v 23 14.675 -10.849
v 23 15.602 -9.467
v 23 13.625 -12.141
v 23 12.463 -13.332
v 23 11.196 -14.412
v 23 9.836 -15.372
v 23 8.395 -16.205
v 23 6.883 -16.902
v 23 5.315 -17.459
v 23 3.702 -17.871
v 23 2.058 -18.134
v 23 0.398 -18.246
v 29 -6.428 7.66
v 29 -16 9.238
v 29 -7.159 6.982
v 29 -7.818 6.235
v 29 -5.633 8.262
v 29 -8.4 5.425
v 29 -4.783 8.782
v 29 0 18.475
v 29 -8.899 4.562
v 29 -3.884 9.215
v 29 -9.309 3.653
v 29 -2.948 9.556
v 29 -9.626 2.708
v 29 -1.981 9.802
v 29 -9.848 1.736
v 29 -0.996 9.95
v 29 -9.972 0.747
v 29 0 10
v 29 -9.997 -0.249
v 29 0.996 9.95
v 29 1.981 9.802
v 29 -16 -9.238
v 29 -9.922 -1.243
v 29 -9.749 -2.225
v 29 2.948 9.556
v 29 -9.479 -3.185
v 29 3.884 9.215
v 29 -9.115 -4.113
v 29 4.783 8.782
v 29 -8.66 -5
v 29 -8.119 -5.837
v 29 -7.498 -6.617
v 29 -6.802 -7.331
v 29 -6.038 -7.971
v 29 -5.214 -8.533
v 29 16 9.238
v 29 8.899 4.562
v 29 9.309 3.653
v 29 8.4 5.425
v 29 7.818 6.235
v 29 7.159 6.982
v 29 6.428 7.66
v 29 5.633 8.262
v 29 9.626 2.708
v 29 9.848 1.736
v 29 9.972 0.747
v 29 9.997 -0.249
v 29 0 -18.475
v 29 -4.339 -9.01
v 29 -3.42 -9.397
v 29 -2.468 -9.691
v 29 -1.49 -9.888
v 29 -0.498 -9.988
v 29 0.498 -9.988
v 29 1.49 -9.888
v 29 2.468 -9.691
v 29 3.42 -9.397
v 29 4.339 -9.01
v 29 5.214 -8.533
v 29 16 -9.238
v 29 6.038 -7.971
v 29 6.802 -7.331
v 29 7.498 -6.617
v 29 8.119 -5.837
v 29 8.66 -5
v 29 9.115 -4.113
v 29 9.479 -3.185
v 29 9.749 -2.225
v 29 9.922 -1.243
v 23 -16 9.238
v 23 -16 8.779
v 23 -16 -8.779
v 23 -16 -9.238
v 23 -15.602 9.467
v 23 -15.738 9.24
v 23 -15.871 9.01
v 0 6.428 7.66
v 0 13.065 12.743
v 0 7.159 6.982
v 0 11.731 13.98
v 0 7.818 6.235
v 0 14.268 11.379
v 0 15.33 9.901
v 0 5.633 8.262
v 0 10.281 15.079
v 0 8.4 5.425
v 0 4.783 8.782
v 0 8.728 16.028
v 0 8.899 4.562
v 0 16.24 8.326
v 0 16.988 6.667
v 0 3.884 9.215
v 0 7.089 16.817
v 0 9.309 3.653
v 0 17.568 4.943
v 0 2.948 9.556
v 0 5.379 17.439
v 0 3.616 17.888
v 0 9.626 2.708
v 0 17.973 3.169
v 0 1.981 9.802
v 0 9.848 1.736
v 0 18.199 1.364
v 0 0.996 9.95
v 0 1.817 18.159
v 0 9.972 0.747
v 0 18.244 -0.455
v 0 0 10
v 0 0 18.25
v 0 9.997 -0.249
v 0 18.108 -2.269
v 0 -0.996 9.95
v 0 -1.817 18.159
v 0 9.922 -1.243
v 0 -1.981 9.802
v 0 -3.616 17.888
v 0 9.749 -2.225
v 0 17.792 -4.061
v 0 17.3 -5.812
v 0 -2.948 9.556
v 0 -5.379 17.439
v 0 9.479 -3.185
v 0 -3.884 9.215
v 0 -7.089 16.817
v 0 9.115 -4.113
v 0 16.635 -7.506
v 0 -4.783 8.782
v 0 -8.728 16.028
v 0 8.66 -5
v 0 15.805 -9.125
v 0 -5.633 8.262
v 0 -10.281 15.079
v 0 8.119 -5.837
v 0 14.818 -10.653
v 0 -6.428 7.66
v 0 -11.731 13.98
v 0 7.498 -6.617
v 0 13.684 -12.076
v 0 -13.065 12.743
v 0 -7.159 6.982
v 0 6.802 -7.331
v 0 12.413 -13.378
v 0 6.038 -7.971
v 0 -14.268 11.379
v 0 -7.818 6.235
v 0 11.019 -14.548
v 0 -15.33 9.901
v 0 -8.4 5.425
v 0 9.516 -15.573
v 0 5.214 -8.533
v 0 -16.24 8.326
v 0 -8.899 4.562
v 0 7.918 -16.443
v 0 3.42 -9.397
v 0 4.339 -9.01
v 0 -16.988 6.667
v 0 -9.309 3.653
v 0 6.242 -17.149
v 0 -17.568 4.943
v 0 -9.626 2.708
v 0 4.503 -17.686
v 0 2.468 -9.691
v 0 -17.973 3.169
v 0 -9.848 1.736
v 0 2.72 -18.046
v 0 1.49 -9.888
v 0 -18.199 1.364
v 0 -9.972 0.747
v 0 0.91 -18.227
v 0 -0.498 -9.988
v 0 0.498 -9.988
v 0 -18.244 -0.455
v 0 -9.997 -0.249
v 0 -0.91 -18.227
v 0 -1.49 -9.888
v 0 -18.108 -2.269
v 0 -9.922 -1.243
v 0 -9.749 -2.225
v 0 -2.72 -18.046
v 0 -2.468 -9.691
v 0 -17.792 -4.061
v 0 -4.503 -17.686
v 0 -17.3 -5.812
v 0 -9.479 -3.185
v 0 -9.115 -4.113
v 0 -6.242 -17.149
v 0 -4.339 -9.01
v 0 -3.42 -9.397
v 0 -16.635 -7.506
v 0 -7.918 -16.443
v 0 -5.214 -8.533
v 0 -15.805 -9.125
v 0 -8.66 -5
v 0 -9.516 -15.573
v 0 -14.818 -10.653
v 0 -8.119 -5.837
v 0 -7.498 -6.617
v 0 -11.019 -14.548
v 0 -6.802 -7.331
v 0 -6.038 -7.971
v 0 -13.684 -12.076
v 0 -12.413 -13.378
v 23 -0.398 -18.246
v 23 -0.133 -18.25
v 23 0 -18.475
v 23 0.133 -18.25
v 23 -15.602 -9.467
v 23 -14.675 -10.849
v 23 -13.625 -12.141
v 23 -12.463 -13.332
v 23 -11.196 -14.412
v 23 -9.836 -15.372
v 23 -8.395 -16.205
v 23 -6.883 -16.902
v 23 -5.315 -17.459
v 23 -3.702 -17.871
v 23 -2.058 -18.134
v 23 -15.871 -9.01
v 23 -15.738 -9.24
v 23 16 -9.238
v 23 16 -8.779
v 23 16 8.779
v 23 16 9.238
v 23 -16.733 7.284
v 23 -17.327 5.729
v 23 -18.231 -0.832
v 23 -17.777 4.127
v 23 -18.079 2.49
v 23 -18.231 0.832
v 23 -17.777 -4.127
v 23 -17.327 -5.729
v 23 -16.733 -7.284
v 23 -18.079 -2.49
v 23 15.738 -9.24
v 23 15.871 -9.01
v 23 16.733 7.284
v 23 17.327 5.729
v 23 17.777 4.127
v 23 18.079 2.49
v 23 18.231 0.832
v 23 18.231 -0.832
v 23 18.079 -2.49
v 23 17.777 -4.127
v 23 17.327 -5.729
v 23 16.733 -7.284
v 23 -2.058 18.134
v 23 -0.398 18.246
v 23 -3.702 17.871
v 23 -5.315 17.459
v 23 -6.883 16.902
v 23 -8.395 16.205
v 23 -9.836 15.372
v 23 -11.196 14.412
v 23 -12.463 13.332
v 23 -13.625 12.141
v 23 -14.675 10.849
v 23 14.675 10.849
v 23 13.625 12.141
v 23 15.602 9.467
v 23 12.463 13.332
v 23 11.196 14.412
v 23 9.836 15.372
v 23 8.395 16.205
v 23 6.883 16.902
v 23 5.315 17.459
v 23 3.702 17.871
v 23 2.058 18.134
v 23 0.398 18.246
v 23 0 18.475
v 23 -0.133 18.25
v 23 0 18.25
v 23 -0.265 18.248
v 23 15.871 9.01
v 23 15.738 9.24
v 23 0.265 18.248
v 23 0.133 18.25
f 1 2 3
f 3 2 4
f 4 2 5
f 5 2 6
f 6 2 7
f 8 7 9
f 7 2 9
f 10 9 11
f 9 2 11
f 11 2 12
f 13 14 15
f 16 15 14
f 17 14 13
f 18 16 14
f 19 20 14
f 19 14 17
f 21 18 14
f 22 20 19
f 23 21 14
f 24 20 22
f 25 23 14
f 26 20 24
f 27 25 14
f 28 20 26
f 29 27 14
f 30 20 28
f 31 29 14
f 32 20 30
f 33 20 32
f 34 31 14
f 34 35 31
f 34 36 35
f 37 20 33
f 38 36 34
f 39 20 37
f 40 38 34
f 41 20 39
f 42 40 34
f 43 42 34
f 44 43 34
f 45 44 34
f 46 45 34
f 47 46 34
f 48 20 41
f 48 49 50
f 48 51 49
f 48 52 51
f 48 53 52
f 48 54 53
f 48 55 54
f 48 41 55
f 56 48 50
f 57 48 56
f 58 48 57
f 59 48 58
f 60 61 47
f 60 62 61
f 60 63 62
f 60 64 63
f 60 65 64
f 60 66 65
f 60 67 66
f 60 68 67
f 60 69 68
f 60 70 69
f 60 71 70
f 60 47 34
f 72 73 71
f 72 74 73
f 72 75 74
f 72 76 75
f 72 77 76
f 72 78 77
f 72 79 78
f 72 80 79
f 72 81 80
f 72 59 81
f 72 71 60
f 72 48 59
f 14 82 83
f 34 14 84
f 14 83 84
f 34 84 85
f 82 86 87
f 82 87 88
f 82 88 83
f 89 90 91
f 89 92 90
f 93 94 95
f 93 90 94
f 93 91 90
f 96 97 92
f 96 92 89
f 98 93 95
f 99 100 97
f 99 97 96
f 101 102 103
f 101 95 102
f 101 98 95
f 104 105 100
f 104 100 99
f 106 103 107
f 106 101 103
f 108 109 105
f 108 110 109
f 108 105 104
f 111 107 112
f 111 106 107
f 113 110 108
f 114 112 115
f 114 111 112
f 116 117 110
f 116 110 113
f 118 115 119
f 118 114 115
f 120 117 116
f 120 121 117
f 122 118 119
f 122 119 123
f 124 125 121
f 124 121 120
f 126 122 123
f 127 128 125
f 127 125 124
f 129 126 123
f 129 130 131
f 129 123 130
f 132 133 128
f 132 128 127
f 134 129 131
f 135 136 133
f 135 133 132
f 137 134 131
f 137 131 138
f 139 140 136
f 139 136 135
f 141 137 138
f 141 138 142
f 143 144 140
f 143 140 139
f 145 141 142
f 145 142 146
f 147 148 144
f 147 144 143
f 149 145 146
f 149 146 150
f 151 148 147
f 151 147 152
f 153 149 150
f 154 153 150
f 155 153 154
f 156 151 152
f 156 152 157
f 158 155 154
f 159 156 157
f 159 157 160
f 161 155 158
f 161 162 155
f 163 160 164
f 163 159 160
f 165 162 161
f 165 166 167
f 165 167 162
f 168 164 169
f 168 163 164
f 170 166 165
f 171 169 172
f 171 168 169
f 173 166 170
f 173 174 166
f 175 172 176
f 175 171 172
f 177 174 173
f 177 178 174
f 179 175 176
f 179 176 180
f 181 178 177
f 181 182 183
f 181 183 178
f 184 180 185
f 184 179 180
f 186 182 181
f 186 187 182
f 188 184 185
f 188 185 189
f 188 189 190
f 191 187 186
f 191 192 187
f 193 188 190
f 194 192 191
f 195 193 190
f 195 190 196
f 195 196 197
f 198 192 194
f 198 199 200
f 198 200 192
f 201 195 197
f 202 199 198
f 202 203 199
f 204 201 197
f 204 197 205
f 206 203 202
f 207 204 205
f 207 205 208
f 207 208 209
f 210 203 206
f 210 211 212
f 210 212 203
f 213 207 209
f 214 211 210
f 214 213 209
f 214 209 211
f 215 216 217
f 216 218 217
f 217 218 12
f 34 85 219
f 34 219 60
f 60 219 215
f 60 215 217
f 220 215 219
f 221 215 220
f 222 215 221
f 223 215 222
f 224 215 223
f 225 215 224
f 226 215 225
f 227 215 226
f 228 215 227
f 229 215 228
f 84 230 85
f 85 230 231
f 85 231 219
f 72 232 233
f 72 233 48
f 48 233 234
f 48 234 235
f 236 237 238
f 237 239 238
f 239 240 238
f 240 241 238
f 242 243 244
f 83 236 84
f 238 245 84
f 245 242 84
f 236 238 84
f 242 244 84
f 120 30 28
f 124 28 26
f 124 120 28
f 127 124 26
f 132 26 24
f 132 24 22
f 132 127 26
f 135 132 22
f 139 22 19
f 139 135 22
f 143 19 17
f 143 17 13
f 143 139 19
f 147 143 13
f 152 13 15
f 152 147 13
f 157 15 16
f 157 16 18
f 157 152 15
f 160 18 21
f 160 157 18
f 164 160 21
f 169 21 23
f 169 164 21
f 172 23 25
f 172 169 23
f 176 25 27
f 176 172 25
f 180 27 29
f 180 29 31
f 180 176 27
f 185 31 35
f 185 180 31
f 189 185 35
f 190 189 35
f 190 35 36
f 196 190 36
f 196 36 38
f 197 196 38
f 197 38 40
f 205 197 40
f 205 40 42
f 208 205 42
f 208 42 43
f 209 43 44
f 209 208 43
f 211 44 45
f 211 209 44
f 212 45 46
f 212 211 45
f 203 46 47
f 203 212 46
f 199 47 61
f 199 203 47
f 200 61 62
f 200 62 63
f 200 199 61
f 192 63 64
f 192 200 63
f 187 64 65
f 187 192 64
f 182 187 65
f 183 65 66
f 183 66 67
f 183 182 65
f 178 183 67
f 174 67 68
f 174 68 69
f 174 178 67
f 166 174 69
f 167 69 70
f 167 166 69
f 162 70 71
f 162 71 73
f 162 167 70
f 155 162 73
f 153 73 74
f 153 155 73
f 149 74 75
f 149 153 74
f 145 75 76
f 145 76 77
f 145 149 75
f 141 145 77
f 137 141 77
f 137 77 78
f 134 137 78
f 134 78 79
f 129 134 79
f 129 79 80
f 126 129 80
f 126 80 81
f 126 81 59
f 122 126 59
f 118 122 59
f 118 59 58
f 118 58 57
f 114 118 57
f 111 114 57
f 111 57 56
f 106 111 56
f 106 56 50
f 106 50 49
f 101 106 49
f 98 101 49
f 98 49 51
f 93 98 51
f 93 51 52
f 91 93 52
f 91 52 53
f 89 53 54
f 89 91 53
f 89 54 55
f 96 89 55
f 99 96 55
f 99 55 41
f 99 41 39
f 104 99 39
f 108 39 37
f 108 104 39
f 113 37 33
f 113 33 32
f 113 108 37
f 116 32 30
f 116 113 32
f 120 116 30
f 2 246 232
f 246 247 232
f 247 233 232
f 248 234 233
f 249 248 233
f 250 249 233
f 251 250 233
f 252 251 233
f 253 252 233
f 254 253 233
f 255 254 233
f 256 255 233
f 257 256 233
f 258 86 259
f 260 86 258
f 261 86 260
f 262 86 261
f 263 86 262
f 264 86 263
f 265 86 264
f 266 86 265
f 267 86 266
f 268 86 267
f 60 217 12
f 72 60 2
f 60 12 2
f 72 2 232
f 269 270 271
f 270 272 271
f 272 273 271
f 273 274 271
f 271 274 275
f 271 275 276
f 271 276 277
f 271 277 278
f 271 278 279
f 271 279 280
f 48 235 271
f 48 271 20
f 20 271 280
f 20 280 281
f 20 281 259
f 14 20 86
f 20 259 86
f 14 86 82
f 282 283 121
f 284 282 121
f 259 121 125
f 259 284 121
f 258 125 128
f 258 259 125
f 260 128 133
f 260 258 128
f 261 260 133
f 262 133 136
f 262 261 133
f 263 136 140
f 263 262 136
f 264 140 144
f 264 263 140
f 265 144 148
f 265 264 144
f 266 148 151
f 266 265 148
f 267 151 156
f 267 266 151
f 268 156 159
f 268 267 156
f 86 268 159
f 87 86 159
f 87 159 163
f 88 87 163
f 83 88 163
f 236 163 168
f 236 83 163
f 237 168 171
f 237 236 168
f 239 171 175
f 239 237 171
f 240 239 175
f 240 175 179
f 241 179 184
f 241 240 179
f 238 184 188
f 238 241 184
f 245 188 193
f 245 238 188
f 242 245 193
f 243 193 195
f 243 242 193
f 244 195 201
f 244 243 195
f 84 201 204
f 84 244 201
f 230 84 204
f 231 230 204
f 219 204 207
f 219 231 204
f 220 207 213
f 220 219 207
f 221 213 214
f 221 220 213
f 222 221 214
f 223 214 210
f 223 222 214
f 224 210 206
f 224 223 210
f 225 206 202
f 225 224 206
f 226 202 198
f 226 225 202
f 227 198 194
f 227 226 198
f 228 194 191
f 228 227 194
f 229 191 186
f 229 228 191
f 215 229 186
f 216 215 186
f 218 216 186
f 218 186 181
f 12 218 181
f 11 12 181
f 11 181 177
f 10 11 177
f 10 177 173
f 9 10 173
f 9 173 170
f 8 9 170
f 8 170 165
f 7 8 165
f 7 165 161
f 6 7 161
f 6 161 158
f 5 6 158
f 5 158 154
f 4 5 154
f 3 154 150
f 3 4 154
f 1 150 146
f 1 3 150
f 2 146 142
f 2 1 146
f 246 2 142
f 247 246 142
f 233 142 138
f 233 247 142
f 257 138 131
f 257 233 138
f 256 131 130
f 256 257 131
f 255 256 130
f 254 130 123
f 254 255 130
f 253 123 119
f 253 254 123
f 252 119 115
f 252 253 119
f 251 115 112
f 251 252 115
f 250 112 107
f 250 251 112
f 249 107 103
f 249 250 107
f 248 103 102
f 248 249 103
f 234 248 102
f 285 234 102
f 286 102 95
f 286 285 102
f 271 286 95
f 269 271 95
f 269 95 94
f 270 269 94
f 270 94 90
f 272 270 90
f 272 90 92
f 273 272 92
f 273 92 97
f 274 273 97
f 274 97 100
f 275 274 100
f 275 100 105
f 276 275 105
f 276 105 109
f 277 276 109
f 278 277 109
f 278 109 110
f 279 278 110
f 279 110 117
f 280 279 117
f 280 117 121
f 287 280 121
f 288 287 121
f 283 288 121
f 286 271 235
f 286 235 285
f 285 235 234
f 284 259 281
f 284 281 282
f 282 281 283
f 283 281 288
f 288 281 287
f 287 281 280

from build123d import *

# Parameters (mm, degrees)
SKETCH_1_W     = 23
SKETCH_1_H     = 8.25
SKETCH_2_R     = 10
F_02_HEX_DEPTH = 6


with BuildPart() as part:
    # 草图1 → 01_SLEEVE (revolve)
    with BuildSketch(Plane.XY, mode=Mode.PRIVATE) as f_01_sleeve_sk:
        with Locations((11.5, 14.125)):
            Rectangle(SKETCH_1_W, SKETCH_1_H)
    revolve(f_01_sleeve_sk.sketch.rotate(Axis((-5, 0, 0), (1, 0, 0)), 90), axis=Axis((-5, 0, 0), (1, 0, 0)))

    # 草图2 → 02_HEX (add)
    with BuildSketch(Plane(origin=(23, 0, 0), x_dir=(0, 0, -1), z_dir=(1, 0, 0))):
        Polygon((18.475208614, 0), (9.237604307, 16), (-9.237604307, 16), (-18.475208614, 0), (-9.237604307, -16), (9.237604307, -16), align=None)
        with Locations(Location((0, 0, 0), (0, 0, 180))):
            Circle(SKETCH_2_R, mode=Mode.SUBTRACT)
    extrude(amount=F_02_HEX_DEPTH)


solid = part.part
